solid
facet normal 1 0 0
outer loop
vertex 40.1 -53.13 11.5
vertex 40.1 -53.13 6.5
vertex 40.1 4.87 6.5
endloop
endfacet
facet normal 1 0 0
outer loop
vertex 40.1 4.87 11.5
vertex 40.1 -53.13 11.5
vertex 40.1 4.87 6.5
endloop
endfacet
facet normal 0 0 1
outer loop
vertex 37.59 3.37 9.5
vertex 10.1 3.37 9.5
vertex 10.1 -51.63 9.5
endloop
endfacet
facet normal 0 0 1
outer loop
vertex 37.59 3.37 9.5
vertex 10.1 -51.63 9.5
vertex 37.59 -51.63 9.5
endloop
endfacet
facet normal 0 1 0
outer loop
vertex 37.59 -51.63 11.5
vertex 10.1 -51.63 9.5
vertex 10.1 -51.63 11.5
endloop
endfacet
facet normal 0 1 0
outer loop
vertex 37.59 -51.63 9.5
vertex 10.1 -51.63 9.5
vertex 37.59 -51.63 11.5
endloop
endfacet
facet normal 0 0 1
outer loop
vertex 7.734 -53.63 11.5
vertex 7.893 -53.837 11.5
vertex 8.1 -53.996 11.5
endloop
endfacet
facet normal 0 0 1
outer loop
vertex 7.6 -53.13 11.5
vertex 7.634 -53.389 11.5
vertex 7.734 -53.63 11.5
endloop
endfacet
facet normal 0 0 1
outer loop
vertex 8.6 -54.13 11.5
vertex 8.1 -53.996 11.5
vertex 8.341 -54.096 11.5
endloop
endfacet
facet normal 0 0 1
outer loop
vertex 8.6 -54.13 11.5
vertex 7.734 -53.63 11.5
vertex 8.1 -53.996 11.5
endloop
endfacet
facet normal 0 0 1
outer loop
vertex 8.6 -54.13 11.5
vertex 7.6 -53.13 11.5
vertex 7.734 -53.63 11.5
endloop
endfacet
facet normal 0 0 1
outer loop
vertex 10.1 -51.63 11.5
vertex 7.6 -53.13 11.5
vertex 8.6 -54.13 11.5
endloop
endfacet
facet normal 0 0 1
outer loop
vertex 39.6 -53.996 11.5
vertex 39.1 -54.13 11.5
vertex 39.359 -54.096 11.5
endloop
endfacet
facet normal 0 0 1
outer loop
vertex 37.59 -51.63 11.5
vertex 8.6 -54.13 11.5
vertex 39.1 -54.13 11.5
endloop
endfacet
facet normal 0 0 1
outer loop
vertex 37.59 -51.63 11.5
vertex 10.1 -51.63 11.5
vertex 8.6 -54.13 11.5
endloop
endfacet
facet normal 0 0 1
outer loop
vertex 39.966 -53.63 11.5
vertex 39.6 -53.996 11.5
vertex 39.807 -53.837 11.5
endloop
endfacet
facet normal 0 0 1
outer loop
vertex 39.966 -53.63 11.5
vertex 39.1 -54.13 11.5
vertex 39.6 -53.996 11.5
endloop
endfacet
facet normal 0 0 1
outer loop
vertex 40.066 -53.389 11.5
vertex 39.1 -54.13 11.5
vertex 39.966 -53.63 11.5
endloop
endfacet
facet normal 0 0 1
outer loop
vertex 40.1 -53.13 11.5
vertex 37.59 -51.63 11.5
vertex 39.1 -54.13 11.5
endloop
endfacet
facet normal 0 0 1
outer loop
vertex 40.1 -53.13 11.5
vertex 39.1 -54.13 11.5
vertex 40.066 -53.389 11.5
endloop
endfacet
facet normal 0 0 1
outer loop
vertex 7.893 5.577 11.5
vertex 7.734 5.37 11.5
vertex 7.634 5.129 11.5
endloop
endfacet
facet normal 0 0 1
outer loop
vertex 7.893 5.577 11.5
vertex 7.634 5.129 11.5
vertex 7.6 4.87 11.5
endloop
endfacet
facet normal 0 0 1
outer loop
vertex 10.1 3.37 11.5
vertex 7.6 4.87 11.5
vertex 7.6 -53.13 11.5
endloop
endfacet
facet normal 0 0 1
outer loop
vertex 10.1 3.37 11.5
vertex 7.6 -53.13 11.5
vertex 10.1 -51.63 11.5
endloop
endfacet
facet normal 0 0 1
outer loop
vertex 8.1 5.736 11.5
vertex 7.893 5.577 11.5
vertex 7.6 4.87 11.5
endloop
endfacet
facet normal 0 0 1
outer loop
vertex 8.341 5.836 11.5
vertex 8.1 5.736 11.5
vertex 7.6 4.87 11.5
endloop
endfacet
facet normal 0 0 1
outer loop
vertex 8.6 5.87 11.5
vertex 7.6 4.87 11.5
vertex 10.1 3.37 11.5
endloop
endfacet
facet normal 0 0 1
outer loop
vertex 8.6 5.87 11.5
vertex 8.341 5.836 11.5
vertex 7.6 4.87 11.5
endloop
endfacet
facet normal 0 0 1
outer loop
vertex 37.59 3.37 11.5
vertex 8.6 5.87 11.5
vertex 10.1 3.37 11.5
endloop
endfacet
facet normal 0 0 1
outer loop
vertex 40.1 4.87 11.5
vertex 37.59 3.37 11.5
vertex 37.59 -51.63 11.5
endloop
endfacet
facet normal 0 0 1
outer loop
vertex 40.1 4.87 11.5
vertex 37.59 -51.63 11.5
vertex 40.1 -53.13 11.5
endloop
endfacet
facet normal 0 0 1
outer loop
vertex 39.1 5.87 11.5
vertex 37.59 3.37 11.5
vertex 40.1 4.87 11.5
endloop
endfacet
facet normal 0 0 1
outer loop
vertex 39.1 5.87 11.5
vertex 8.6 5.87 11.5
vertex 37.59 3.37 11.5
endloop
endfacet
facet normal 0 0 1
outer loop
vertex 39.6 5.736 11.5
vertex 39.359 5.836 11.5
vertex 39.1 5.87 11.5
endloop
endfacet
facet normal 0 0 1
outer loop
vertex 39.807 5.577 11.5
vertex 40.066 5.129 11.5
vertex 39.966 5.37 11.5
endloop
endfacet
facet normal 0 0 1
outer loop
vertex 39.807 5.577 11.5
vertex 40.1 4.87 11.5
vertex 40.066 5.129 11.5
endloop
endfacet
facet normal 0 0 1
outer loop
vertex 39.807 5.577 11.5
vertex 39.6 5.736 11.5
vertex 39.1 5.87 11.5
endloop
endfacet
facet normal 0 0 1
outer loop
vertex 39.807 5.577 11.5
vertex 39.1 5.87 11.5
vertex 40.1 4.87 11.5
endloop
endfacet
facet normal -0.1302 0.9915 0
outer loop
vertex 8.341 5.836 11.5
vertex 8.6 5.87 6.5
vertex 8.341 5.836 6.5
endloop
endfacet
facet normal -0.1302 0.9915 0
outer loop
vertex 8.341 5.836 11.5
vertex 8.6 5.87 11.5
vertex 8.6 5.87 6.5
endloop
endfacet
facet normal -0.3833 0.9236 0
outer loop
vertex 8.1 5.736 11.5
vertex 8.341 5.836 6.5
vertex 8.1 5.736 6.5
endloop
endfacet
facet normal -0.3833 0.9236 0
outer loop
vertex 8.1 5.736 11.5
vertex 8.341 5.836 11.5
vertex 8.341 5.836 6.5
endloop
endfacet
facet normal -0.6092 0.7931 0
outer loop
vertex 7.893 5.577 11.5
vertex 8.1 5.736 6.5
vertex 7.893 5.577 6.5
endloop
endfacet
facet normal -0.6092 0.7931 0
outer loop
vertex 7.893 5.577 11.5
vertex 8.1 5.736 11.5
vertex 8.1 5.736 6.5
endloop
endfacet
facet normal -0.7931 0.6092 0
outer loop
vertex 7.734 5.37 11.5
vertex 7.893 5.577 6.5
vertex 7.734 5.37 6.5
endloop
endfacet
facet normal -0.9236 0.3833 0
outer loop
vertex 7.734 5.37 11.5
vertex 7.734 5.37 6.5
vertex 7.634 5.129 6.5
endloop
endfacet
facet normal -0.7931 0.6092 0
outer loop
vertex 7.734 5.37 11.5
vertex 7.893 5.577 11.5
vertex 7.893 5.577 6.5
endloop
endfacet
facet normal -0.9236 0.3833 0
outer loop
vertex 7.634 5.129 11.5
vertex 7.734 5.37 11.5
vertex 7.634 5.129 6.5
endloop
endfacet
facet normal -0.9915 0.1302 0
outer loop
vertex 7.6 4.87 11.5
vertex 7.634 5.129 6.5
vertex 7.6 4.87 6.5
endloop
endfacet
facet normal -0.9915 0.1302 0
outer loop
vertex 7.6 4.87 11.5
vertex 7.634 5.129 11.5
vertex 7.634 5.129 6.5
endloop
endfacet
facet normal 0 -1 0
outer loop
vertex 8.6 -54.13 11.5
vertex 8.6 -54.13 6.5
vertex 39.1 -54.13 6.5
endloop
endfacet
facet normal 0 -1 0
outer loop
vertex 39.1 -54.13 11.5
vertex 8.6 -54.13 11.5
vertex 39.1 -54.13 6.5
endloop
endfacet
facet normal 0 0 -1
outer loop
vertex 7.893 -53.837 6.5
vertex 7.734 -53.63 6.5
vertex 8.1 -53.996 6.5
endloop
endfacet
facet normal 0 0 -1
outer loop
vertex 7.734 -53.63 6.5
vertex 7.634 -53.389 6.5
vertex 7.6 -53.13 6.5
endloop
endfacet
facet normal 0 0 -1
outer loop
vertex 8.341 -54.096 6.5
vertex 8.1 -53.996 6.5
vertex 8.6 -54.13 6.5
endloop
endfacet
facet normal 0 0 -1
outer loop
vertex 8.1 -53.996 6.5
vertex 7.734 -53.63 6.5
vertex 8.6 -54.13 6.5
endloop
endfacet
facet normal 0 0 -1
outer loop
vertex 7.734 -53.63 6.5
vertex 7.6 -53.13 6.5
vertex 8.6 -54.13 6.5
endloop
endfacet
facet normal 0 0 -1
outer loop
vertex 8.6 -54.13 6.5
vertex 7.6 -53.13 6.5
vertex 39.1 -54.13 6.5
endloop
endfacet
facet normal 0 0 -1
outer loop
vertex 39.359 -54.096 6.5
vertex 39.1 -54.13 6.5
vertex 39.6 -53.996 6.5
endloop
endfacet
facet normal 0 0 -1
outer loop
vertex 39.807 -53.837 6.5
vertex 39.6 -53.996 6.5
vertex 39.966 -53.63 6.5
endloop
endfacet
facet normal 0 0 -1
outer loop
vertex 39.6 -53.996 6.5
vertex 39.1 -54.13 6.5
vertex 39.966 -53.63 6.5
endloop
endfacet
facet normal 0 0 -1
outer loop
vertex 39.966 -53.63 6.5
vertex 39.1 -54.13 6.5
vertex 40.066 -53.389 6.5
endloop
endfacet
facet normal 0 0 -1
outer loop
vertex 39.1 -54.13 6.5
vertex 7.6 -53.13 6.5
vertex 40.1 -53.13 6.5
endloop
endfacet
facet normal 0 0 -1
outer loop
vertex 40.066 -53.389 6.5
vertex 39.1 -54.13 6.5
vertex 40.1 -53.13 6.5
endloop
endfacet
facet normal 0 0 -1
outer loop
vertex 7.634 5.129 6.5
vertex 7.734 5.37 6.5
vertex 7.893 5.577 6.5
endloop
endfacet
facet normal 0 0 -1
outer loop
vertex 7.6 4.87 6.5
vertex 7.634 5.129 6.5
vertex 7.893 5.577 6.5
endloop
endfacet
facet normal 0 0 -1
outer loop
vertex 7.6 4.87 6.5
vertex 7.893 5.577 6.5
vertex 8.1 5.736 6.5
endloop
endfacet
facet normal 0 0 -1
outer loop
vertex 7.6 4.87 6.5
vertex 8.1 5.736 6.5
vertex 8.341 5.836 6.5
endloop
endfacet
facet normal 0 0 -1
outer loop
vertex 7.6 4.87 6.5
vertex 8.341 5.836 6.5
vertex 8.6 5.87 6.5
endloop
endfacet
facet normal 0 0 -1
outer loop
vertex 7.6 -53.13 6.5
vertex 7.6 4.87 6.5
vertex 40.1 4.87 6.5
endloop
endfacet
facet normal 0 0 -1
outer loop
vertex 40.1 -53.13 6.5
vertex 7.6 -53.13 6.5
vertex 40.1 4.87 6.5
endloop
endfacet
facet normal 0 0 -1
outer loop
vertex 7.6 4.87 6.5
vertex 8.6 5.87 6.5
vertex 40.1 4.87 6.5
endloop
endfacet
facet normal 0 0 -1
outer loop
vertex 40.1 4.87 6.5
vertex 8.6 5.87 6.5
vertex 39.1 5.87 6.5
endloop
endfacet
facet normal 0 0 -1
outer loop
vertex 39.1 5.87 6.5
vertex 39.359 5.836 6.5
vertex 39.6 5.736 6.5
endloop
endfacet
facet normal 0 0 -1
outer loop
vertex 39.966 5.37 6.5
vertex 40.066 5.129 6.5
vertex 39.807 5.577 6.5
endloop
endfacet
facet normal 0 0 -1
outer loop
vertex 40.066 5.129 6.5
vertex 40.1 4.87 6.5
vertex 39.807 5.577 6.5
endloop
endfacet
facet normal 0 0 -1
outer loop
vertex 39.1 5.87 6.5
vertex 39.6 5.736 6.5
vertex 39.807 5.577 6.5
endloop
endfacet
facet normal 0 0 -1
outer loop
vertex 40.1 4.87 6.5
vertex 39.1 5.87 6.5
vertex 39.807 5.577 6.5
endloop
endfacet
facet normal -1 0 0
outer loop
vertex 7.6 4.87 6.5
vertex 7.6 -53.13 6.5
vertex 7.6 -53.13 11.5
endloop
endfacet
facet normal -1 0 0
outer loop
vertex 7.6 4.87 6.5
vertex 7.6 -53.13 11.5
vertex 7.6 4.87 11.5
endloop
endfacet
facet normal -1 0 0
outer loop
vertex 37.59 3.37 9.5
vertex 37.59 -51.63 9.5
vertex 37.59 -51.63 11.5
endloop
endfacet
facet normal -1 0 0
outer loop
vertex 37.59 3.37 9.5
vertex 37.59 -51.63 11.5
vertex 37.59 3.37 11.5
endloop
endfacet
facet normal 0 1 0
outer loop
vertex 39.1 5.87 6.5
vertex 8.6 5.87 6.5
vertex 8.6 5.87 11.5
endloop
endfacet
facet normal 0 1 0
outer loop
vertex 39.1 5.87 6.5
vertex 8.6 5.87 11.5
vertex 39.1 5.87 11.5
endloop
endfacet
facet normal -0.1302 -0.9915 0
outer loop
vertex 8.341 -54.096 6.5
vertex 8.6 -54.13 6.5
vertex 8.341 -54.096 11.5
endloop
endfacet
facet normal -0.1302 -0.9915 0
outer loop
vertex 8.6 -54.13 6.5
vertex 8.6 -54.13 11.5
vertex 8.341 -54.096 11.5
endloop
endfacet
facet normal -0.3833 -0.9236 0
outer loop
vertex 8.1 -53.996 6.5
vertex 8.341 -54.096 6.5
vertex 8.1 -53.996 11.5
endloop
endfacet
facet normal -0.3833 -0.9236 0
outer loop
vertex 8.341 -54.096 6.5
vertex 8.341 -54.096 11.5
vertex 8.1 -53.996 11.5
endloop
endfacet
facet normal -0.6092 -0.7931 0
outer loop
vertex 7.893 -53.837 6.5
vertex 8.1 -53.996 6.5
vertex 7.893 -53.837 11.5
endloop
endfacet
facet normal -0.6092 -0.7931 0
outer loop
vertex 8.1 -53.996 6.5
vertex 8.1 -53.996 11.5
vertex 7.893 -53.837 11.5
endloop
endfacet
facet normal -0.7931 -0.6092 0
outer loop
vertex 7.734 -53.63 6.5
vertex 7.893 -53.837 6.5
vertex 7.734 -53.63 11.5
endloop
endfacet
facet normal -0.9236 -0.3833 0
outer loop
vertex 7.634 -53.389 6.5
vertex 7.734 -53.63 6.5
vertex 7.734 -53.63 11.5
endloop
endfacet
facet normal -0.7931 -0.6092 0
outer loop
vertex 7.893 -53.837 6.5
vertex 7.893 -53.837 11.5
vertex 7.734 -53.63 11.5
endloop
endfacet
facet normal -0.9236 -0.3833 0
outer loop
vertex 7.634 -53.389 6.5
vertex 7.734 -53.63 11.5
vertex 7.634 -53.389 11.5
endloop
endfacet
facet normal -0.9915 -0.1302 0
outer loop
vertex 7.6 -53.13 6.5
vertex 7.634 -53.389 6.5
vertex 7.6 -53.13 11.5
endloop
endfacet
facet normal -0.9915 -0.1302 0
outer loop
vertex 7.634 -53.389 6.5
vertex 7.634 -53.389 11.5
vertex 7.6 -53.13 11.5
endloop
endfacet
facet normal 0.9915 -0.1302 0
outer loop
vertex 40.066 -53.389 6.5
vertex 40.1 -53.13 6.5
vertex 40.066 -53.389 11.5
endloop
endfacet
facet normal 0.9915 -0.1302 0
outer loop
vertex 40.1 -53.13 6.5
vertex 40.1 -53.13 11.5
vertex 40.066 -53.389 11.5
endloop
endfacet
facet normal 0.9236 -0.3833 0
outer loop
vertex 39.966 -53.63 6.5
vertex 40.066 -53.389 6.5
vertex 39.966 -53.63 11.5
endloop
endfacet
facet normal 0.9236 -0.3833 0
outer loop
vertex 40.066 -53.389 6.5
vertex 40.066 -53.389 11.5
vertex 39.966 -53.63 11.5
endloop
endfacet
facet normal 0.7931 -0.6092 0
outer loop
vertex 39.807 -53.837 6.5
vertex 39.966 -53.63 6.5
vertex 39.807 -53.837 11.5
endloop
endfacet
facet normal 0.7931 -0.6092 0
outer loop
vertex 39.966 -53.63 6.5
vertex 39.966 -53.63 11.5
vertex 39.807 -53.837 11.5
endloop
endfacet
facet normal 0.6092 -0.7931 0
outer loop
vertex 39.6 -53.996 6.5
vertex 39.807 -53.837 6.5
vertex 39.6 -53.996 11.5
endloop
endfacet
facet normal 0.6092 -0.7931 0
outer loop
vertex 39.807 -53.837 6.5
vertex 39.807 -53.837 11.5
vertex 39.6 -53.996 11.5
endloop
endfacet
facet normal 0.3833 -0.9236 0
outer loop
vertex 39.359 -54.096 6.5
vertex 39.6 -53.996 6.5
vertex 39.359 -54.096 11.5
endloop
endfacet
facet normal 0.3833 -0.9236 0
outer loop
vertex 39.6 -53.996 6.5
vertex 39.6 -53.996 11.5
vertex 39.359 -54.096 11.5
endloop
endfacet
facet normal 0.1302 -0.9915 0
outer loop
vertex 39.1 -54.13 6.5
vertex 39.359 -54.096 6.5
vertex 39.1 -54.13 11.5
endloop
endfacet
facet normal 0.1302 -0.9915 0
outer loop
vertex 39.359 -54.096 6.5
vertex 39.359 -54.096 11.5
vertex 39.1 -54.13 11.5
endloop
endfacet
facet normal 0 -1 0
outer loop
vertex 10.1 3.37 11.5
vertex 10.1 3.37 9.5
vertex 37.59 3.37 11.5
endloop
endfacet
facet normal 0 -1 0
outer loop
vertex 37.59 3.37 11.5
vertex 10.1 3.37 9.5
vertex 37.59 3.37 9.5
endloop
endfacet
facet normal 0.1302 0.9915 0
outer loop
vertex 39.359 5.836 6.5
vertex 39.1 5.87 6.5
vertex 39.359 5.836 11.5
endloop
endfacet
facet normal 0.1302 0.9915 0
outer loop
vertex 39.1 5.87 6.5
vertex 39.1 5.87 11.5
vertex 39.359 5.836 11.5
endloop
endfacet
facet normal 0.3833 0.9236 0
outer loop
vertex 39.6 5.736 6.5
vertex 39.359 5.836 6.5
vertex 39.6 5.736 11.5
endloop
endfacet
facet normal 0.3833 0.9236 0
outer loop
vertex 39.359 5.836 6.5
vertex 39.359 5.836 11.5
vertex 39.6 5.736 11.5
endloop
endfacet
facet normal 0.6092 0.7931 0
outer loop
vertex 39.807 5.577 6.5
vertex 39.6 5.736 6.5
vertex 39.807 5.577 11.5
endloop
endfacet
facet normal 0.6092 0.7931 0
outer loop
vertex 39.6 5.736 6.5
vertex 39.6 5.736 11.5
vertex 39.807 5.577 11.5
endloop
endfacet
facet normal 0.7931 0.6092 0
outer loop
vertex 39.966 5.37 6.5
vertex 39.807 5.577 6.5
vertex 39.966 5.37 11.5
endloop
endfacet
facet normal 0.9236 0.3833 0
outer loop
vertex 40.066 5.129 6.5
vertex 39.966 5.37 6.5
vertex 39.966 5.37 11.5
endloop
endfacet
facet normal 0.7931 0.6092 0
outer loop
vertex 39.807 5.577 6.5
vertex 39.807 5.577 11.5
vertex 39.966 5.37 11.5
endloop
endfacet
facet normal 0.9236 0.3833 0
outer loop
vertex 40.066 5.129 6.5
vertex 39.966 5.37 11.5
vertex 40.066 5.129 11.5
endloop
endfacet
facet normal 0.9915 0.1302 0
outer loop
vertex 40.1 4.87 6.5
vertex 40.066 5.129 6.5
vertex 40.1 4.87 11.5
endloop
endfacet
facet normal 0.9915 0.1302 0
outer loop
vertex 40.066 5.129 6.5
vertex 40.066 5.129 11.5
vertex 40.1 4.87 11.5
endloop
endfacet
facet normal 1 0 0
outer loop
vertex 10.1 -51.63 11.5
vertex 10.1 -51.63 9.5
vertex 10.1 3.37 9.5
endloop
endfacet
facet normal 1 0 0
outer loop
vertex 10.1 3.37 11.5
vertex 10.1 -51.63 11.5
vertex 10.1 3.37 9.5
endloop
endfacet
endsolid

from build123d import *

# Parameters (mm, degrees)
BOX002_W     = 27.49
BOX002_H     = 55
BOX002_DEPTH = 2
BOX_W        = 32.5
BOX_H        = 60
BOX_DEPTH    = 5
FILLET_R     = 1
FILLET001_R  = 1
FILLET002_R  = 1
FILLET003_R  = 1


with BuildPart() as hole_i_frame:
    # Box002 → Box002 (new body)
    with BuildSketch(Plane(origin=(10.1, -51.63, 4), x_dir=(1, 0, 0), z_dir=(0, 0, 1))):
        with Locations((13.745, 27.5)):
            Rectangle(BOX002_W, BOX002_H)
    extrude(amount=BOX002_DEPTH)


with BuildPart() as fillet003:
    # Box → Box (new body)
    with BuildSketch(Plane(origin=(7.6, -54.13, 1), x_dir=(1, 0, 0), z_dir=(0, 0, 1))):
        with Locations((16.25, 30)):
            Rectangle(BOX_W, BOX_H)
    extrude(amount=BOX_DEPTH)

    # Cut: cut Hole i frame
    add(hole_i_frame.part, mode=Mode.SUBTRACT)

    # Fillet
    fillet_edges = [fillet003.edges().sort_by_distance(p)[0] for p in [
        (40.1, 5.87, 3.5),
    ]]
    fillet(fillet_edges, radius=FILLET_R)

    # Fillet001
    fillet001_edges = [fillet003.edges().sort_by_distance(p)[0] for p in [
        (7.6, 5.87, 3.5),
    ]]
    fillet(fillet001_edges, radius=FILLET001_R)

    # Fillet002
    fillet002_edges = [fillet003.edges().sort_by_distance(p)[0] for p in [
        (40.1, -54.13, 3.5),
    ]]
    fillet(fillet002_edges, radius=FILLET002_R)

    # Fillet003
    fillet003_edges = [fillet003.edges().sort_by_distance(p)[0] for p in [
        (7.6, -54.13, 3.5),
    ]]
    fillet(fillet003_edges, radius=FILLET003_R)


with BuildPart() as fillet003_1:
    # Fillet003 placement: moved
    add(fillet003.part.moved(Location((0, 0, 5.5))))


solid = fillet003_1.part
